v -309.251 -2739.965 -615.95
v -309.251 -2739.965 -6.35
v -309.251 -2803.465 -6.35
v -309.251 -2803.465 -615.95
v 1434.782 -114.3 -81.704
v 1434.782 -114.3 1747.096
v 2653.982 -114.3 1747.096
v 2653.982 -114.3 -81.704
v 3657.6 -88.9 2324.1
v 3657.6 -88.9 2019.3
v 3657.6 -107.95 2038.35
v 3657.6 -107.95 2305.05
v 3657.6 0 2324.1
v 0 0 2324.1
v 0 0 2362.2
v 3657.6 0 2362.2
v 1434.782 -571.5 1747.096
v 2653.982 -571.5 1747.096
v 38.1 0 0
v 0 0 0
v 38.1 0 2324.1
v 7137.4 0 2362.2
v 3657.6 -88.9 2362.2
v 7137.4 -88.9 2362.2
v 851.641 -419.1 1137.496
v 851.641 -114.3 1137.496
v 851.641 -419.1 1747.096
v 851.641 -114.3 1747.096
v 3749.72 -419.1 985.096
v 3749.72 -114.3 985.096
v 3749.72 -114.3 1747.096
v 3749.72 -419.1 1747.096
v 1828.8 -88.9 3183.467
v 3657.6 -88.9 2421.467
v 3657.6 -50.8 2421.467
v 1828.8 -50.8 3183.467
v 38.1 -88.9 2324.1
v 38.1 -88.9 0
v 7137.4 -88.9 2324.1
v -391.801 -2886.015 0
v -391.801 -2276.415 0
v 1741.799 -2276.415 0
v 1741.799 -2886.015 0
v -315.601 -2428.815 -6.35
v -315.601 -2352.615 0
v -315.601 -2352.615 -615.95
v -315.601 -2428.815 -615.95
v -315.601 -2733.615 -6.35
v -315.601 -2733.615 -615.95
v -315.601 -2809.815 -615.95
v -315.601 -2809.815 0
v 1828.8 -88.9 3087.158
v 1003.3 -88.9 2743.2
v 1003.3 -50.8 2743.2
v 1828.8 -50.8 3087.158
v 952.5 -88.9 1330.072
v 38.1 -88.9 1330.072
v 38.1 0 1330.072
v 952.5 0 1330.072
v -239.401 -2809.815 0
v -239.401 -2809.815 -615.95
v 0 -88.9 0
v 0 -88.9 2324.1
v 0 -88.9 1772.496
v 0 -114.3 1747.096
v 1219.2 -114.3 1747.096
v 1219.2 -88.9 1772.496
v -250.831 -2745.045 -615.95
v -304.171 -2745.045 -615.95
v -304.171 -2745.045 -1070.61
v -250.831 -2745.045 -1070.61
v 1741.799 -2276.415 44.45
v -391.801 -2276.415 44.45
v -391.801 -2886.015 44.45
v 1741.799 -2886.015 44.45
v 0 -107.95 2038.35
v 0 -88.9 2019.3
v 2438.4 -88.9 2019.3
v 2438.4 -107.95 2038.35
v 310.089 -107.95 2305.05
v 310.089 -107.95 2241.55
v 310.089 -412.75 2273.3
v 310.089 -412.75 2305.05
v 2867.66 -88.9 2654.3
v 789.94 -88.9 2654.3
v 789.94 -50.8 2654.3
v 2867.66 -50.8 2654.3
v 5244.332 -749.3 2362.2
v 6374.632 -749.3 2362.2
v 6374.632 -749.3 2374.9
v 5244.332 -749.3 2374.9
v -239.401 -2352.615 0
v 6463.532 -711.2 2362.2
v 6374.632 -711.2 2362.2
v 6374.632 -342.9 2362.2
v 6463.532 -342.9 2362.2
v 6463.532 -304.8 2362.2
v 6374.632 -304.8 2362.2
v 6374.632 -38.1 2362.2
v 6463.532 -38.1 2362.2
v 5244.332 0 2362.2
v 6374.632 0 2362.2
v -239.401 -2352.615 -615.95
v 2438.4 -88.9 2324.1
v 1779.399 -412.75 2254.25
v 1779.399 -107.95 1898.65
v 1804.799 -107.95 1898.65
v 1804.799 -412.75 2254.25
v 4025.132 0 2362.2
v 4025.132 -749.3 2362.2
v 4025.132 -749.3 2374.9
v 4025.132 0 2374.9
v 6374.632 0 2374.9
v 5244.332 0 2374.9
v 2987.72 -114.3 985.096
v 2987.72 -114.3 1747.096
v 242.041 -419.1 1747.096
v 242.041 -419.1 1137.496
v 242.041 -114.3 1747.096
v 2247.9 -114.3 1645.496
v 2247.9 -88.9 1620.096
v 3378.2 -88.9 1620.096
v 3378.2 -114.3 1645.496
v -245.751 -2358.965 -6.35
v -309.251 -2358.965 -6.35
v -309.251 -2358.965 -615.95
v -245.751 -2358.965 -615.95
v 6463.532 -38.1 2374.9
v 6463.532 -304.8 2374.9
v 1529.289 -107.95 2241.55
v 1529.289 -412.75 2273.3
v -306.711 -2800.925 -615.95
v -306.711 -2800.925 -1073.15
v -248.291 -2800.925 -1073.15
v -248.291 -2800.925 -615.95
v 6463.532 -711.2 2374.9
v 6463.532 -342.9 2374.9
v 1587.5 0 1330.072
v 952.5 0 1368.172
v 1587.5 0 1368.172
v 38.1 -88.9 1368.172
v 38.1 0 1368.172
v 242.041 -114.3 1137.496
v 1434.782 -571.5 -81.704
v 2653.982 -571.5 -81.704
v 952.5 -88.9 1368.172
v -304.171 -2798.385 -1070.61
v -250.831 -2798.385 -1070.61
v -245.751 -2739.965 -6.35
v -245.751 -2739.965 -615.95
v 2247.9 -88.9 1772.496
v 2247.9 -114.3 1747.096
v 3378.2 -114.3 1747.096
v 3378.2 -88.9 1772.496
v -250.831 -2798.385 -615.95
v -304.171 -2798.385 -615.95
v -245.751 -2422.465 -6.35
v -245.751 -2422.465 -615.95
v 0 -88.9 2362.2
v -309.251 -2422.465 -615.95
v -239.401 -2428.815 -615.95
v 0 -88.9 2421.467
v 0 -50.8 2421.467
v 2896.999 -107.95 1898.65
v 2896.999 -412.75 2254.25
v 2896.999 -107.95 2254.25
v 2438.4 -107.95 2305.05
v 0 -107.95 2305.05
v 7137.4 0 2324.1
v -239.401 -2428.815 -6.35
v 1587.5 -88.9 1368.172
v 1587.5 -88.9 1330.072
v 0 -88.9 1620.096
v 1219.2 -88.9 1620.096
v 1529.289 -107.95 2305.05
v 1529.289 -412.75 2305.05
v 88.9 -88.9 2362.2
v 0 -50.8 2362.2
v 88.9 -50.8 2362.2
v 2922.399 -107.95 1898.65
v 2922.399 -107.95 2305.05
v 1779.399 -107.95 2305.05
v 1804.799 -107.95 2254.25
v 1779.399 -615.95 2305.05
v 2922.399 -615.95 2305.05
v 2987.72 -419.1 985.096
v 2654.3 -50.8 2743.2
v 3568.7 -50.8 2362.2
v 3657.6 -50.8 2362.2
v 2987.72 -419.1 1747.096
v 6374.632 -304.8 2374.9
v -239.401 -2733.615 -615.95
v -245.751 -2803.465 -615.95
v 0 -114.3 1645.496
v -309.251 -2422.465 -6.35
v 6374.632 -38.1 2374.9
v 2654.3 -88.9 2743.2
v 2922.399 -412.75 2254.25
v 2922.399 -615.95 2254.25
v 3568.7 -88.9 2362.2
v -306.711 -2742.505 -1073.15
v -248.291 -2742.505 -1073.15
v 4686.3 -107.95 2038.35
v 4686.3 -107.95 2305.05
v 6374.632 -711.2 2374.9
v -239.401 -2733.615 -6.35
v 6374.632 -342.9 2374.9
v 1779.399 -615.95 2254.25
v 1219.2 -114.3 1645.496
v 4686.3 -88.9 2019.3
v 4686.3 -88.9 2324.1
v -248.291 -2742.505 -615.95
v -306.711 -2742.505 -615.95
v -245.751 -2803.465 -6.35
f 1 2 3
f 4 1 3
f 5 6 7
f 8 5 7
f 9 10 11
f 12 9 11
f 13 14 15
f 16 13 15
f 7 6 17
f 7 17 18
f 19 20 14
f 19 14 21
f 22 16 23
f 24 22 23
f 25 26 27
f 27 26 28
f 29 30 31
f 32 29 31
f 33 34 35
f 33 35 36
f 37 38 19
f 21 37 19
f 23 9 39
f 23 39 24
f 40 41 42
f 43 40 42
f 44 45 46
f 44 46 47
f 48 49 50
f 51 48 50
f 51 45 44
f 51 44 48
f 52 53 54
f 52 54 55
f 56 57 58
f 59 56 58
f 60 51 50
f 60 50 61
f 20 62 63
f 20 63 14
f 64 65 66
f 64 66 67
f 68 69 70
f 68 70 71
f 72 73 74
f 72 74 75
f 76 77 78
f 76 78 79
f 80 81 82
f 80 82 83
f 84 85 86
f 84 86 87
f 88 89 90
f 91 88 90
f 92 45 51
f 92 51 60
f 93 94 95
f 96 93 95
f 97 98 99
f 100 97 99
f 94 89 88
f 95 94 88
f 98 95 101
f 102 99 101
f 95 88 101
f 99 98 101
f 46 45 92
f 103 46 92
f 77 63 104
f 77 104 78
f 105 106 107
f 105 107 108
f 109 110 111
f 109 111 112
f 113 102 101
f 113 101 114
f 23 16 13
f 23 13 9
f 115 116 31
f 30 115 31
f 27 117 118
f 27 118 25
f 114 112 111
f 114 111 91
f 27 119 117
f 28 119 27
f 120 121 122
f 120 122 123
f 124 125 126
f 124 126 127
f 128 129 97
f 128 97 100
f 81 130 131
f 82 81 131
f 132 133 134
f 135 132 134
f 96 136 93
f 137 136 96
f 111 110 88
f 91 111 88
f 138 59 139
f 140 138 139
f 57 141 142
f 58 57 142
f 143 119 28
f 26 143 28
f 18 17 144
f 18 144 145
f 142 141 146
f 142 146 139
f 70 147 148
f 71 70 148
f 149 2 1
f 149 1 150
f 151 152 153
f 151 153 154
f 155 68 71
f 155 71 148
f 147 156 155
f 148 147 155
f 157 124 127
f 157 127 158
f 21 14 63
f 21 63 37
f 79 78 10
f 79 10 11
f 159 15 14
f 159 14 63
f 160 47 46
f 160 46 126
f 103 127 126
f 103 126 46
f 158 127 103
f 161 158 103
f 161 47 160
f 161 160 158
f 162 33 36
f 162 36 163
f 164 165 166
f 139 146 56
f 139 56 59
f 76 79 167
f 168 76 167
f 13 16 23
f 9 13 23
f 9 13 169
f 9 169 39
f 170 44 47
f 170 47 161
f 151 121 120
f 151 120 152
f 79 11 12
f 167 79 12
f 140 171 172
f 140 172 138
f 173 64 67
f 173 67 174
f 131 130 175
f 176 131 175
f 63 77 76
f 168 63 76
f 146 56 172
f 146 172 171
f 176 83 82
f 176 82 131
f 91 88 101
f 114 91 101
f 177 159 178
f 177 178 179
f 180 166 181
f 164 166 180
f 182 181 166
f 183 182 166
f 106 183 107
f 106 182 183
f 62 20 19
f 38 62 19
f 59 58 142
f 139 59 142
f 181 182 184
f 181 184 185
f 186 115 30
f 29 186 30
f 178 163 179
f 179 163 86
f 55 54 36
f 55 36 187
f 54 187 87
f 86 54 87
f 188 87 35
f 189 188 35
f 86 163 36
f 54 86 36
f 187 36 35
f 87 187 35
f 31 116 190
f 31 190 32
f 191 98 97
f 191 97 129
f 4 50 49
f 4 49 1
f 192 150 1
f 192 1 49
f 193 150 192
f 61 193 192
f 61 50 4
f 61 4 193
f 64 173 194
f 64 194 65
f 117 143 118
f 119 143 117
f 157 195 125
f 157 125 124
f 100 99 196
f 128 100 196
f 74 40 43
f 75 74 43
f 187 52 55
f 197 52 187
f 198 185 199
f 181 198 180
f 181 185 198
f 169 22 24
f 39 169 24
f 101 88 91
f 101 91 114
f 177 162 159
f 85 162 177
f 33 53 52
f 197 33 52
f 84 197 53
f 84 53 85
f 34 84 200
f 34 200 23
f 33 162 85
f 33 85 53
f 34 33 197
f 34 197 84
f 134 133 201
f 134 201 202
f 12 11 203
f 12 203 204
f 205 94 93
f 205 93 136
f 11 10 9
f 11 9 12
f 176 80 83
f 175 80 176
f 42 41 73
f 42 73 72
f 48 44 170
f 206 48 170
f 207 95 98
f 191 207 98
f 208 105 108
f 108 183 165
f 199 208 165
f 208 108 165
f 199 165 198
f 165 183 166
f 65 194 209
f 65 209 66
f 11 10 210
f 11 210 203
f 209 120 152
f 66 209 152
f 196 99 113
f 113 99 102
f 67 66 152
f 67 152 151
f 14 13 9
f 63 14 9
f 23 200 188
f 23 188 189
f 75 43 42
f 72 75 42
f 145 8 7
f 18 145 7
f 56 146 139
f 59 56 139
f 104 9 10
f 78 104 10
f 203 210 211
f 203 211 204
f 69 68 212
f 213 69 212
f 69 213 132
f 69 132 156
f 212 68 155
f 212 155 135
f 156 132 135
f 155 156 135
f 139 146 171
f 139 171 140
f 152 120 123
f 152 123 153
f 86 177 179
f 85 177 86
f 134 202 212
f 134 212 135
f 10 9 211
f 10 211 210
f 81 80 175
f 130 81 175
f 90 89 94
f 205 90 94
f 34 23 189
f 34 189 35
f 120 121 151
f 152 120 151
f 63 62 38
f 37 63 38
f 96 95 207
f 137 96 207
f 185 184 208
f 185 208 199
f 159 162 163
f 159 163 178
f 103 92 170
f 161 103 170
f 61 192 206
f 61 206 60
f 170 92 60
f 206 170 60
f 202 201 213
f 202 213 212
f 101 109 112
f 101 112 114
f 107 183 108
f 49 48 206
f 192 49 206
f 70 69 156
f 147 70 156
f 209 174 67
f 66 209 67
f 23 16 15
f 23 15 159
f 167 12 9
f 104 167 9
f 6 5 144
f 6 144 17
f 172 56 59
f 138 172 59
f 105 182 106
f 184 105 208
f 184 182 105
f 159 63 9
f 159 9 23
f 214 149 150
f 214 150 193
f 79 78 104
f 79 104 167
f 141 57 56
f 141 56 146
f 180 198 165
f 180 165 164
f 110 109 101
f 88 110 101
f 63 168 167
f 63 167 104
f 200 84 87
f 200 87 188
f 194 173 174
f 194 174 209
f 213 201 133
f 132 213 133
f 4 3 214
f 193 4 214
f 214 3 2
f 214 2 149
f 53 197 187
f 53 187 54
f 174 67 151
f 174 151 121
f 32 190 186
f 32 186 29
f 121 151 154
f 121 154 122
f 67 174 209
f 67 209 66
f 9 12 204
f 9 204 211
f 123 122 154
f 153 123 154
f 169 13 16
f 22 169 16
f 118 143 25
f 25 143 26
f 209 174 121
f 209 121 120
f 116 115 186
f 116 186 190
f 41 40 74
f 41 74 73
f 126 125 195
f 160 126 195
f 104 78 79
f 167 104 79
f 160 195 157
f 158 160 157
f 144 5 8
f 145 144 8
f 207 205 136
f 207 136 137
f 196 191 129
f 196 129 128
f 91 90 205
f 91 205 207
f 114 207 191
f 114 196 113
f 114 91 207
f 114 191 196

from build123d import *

# Parameters (mm, degrees)
F0_W      = 38.1
F0_H      = 88.9
F1_DEPTH  = 2324.1
F2_W      = 88.9
F2_H      = 38.1
F3_DEPTH  = 3657.6
F5_DEPTH  = 2438.4
F6_DEPTH  = 1219.2
F8_DEPTH  = 1219.2
F9_W      = 88.9
F9_H      = 38.1
F10_DEPTH = 914.4
F11_DEPTH = 1028.7
F12_DEPTH = 1028.7
F13_W     = 609.6
F13_H     = 609.6
F14_DEPTH = 304.8
F15_W     = 1219.2
F15_H     = 1828.8
F16_DEPTH = 457.2
F17_W     = 762
F17_H     = 762
F18_DEPTH = 304.8
F19_W     = 1219.2
F19_H     = 63.5
F20_DEPTH = 304.8
F22_DEPTH = 1529.2895152817
F23_W     = 1143
F23_H     = 50.8
F24_DEPTH = 508
F26_DEPTH = 25.4
F28_DEPTH = 25.4
F29_DEPTH = 1130.3
F30_W     = 1219.2
F30_H     = 749.3
F31_DEPTH = 12.7
F32_DEPTH = 3479.8
F33_DEPTH = 1130.3
F34_DEPTH = 635
F35_W     = 266.7
F35_H     = 12.7
F35_W_2   = 368.3
F36_DEPTH = 88.9
F37_W     = 2133.6
F37_H     = 609.6
F38_DEPTH = 44.45
F40_DEPTH = 38.1
F42_DEPTH = 6.35
F43_W     = 76.2
F43_H     = 76.2
F44_DEPTH = 609.6
F45_T     = -6.35
F46_W     = 58.42
F46_H     = 58.42
F47_DEPTH = 457.2
F48_T     = -2.54


with BuildPart() as f1:
    # F0 (on Top) → F1 (new body)
    with BuildSketch(Plane.XY):
        with Locations((19.05, -44.45)):
            Rectangle(F0_W, F0_H)
    extrude(amount=F1_DEPTH)


with BuildPart() as f3:
    # F2 (on face) → F3 (new body)
    with BuildSketch(Plane(origin=(0, 0, 0), x_dir=(0, -1, 0), z_dir=(-1, 0, 0))):
        with Locations((44.45, 2343.15)):
            Rectangle(F2_W, F2_H)
    extrude(amount=-F3_DEPTH)


with BuildPart() as f5:
    # F4 (on face) → F5 (new body)
    with BuildSketch(Plane(origin=(0, 0, 0), x_dir=(0, -1, 0), z_dir=(-1, 0, 0))):
        Polygon((107.95, 2305.05), (88.9, 2324.1), (88.9, 2019.3), (107.95, 2038.35), align=None)
    extrude(amount=-F5_DEPTH)


with BuildPart() as f6:
    # F6 (new): a face of the model
    f6_faces = [f5.part.faces().sort_by_distance(p)[0] for p in [
        (2438.4, -98.2133333333, 2171.7),
    ]]
    extrude(f6_faces, amount=F6_DEPTH)


with BuildPart() as f8:
    # F7 (on face) → F8 (new body)
    with BuildSketch(Plane(origin=(0, 0, 0), x_dir=(0, -1, 0), z_dir=(-1, 0, 0))):
        Polygon((114.3, 1747.0956106186), (88.9, 1772.4956106186), (88.9, 1620.0956106186), (114.3, 1645.4956106186), align=None)
    extrude(amount=-F8_DEPTH)


with BuildPart() as f10:
    # F9 (on face) → F10 (new body)
    with BuildSketch(Plane.YZ.offset(38.1)):
        with Locations((-44.45, 1349.1220453262)):
            Rectangle(F9_W, F9_H)
    extrude(amount=F10_DEPTH)


with BuildPart() as f11:
    # F11 (new): a face of the model
    f11_faces = [f6.part.faces().sort_by_distance(p)[0] for p in [
        (3657.6, -98.2133333333, 2171.7),
    ]]
    extrude(f11_faces, amount=F11_DEPTH)


with BuildPart() as f12:
    # F12 (new): a face of the model
    f12_faces = [f8.part.faces().sort_by_distance(p)[0] for p in [
        (1219.2, -100.7533333333, 1696.2956106186),
    ]]
    extrude(f12_faces, amount=F12_DEPTH)


with BuildPart() as f14:
    # F13 (on face) → F14 (new body)
    with BuildSketch(Plane.XZ.offset(114.3)):
        with Locations((546.8414686203, 1442.2956106186)):
            Rectangle(F13_W, F13_H)
    extrude(amount=F14_DEPTH)


with BuildPart() as f16:
    # F15 (on face) → F16 (new body)
    with BuildSketch(Plane.XZ.offset(114.3)):
        with Locations((2044.3823858261, 832.6956106186)):
            Rectangle(F15_W, F15_H)
    extrude(amount=F16_DEPTH)


with BuildPart() as f18:
    # F17 (on face) → F18 (new body)
    with BuildSketch(Plane.XZ.offset(114.3)):
        with Locations((3368.7196163048, 1366.0956106186)):
            Rectangle(F17_W, F17_H)
    extrude(amount=F18_DEPTH)


with BuildPart() as f20:
    # F19 (on face) → F20 (new body)
    with BuildSketch(Plane.XZ.offset(107.95)):
        with Locations((919.6885152817, 2273.3)):
            Rectangle(F19_W, F19_H)
    extrude(amount=F20_DEPTH)

    # F21 (on face) → F22 (cut, through all)
    with BuildSketch(Plane.YZ.offset(1529.2885152817)):
        Polygon((-107.95, 2241.55), (-412.75, 2273.3), (-412.75, 2241.55), align=None)
    extrude(amount=-F22_DEPTH, mode=Mode.SUBTRACT)


with BuildPart() as f24:
    # F23 (on face) → F24 (new body)
    with BuildSketch(Plane.XZ.offset(107.95)):
        with Locations((2350.8992757797, 2279.65)):
            Rectangle(F23_W, F23_H)
    extrude(amount=F24_DEPTH)

    # F25 (on face) → F26 (join)
    with BuildSketch(Plane.YZ.offset(2922.3992757797)):
        Polygon((-107.95, 1898.65), (-107.95, 2254.25), (-412.75, 2254.25), align=None)
    extrude(amount=-F26_DEPTH)

    # F27 (on face) → F28 (join)
    with BuildSketch(Plane(origin=(1779.3992757797, 0, 0), x_dir=(0, -1, 0), z_dir=(-1, 0, 0))):
        Polygon((107.95, 2254.25), (107.95, 1898.65), (412.75, 2254.25), align=None)
    extrude(amount=-F28_DEPTH)


with BuildPart() as f29:
    # F29 (new): a face of the model
    f29_faces = [f12.part.faces().sort_by_distance(p)[0] for p in [
        (2247.9, -100.7533333333, 1696.2956106186),
    ]]
    extrude(f29_faces, amount=F29_DEPTH)


with BuildPart() as f31:
    # F30 (on face) → F31 (new body)
    with BuildSketch(Plane.XY.offset(2362.2)):
        with Locations((4634.7321610946, -374.65)):
            Rectangle(F30_W, F30_H)
    extrude(amount=F31_DEPTH)


with BuildPart() as f32:
    # F32 (new): a face of the model
    f32_faces = [f3.part.faces().sort_by_distance(p)[0] for p in [
        (3657.6, -44.45, 2343.15),
    ]]
    extrude(f32_faces, amount=F32_DEPTH)


with BuildPart() as f33:
    # F33 (new): a face of the model
    f33_faces = [f31.part.faces().sort_by_distance(p)[0] for p in [
        (5244.3321610946, -374.65, 2368.55),
    ]]
    extrude(f33_faces, amount=F33_DEPTH)

    # F35 (on face) → F36 (join)
    with BuildSketch(Plane.YZ.offset(6374.6321610946)):
        with Locations((-171.45, 2368.55)):
            Rectangle(F35_W, F35_H)
        with Locations((-527.05, 2368.55)):
            Rectangle(F35_W_2, F35_H)
    extrude(amount=F36_DEPTH)


with BuildPart() as f34:
    # F34 (new): a face of the model
    f34_faces = [f10.part.faces().sort_by_distance(p)[0] for p in [
        (952.5, -44.45, 1349.1220453262),
    ]]
    extrude(f34_faces, amount=F34_DEPTH)


with BuildPart() as f38:
    # F37 (on Top) → F38 (new body)
    with BuildSketch(Plane.XY):
        with Locations((674.9990154266, -2581.2145842905)):
            Rectangle(F37_W, F37_H)
    extrude(amount=F38_DEPTH)


with BuildPart() as f40:
    # F39 (on face) → F40 (new body)
    with BuildSketch(Plane.XZ.offset(88.9)):
        Polygon((1828.8, 3183.4666666667), (0, 2421.4666666667), (0, 2362.2), (88.9, 2362.2), (789.94, 2654.3), (1003.3, 2743.2), (1828.8, 3087.1583333333), align=None)
        Polygon((3657.6, 2421.4666666667), (1828.8, 3183.4666666667), (1828.8, 3087.1583333333), (2654.3, 2743.2), (2867.66, 2654.3), (3263.9, 2489.2), (3568.7, 2362.2), (3657.6, 2362.2), align=None)
        Polygon((2654.3, 2743.2), (1828.8, 2743.2), (1828.8, 2654.3), (2867.66, 2654.3), align=None)
        Polygon((1828.8, 2654.3), (1828.8, 2743.2), (1003.3, 2743.2), (789.94, 2654.3), align=None)
    extrude(amount=-F40_DEPTH)


with BuildPart() as f42:
    # F41 (on face) → F42 (new body)
    with BuildSketch(Plane(origin=(0, 0, 0), x_dir=(1, 0, 0), z_dir=(0, 0, -1))):
        Polygon((-239.4009845734, 2809.8145842905), (-315.6009845734, 2809.8145842905), (-315.6009845734, 2581.2145842905), (-315.6009845734, 2352.6145842905), (-239.4009845734, 2352.6145842905), align=None)
    extrude(amount=F42_DEPTH)

    # F43 (on face) → F44 (join)
    with BuildSketch(Plane(origin=(0, 0, -6.35), x_dir=(1, 0, 0), z_dir=(0, 0, -1))):
        with Locations((-277.5009845734, 2771.7145842905)):
            Rectangle(F43_W, F43_H)
        with Locations((-277.5009845734, 2390.7145842905)):
            Rectangle(F43_W, F43_H)
    extrude(amount=F44_DEPTH)

    # F45
    f45_openings = [f42.faces().sort_by_distance(p)[0] for p in [
        (-277.500985, -2771.714584, -615.95),
        (-277.500985, -2390.714584, -615.95),
    ]]
    offset(amount=F45_T, openings=f45_openings, kind=Kind.INTERSECTION)


with BuildPart() as f47:
    # F46 (on face) → F47 (new body)
    with BuildSketch(Plane(origin=(0, 0, -615.95), x_dir=(1, 0, 0), z_dir=(0, 0, -1))):
        with Locations((-277.5009845734, 2771.7145842905)):
            Rectangle(F46_W, F46_H)
    extrude(amount=F47_DEPTH)

    # F48
    f48_openings = [f47.faces().sort_by_distance(p)[0] for p in [
        (-277.500985, -2771.714584, -615.95),
    ]]
    offset(amount=F48_T, openings=f48_openings)


solid = Compound([f1.part, f3.part, f5.part, f6.part, f8.part, f10.part, f11.part, f12.part, f14.part, f16.part, f18.part, f20.part, f24.part, f29.part, f31.part, f32.part, f33.part, f34.part, f38.part, f40.part, f42.part, f47.part])
